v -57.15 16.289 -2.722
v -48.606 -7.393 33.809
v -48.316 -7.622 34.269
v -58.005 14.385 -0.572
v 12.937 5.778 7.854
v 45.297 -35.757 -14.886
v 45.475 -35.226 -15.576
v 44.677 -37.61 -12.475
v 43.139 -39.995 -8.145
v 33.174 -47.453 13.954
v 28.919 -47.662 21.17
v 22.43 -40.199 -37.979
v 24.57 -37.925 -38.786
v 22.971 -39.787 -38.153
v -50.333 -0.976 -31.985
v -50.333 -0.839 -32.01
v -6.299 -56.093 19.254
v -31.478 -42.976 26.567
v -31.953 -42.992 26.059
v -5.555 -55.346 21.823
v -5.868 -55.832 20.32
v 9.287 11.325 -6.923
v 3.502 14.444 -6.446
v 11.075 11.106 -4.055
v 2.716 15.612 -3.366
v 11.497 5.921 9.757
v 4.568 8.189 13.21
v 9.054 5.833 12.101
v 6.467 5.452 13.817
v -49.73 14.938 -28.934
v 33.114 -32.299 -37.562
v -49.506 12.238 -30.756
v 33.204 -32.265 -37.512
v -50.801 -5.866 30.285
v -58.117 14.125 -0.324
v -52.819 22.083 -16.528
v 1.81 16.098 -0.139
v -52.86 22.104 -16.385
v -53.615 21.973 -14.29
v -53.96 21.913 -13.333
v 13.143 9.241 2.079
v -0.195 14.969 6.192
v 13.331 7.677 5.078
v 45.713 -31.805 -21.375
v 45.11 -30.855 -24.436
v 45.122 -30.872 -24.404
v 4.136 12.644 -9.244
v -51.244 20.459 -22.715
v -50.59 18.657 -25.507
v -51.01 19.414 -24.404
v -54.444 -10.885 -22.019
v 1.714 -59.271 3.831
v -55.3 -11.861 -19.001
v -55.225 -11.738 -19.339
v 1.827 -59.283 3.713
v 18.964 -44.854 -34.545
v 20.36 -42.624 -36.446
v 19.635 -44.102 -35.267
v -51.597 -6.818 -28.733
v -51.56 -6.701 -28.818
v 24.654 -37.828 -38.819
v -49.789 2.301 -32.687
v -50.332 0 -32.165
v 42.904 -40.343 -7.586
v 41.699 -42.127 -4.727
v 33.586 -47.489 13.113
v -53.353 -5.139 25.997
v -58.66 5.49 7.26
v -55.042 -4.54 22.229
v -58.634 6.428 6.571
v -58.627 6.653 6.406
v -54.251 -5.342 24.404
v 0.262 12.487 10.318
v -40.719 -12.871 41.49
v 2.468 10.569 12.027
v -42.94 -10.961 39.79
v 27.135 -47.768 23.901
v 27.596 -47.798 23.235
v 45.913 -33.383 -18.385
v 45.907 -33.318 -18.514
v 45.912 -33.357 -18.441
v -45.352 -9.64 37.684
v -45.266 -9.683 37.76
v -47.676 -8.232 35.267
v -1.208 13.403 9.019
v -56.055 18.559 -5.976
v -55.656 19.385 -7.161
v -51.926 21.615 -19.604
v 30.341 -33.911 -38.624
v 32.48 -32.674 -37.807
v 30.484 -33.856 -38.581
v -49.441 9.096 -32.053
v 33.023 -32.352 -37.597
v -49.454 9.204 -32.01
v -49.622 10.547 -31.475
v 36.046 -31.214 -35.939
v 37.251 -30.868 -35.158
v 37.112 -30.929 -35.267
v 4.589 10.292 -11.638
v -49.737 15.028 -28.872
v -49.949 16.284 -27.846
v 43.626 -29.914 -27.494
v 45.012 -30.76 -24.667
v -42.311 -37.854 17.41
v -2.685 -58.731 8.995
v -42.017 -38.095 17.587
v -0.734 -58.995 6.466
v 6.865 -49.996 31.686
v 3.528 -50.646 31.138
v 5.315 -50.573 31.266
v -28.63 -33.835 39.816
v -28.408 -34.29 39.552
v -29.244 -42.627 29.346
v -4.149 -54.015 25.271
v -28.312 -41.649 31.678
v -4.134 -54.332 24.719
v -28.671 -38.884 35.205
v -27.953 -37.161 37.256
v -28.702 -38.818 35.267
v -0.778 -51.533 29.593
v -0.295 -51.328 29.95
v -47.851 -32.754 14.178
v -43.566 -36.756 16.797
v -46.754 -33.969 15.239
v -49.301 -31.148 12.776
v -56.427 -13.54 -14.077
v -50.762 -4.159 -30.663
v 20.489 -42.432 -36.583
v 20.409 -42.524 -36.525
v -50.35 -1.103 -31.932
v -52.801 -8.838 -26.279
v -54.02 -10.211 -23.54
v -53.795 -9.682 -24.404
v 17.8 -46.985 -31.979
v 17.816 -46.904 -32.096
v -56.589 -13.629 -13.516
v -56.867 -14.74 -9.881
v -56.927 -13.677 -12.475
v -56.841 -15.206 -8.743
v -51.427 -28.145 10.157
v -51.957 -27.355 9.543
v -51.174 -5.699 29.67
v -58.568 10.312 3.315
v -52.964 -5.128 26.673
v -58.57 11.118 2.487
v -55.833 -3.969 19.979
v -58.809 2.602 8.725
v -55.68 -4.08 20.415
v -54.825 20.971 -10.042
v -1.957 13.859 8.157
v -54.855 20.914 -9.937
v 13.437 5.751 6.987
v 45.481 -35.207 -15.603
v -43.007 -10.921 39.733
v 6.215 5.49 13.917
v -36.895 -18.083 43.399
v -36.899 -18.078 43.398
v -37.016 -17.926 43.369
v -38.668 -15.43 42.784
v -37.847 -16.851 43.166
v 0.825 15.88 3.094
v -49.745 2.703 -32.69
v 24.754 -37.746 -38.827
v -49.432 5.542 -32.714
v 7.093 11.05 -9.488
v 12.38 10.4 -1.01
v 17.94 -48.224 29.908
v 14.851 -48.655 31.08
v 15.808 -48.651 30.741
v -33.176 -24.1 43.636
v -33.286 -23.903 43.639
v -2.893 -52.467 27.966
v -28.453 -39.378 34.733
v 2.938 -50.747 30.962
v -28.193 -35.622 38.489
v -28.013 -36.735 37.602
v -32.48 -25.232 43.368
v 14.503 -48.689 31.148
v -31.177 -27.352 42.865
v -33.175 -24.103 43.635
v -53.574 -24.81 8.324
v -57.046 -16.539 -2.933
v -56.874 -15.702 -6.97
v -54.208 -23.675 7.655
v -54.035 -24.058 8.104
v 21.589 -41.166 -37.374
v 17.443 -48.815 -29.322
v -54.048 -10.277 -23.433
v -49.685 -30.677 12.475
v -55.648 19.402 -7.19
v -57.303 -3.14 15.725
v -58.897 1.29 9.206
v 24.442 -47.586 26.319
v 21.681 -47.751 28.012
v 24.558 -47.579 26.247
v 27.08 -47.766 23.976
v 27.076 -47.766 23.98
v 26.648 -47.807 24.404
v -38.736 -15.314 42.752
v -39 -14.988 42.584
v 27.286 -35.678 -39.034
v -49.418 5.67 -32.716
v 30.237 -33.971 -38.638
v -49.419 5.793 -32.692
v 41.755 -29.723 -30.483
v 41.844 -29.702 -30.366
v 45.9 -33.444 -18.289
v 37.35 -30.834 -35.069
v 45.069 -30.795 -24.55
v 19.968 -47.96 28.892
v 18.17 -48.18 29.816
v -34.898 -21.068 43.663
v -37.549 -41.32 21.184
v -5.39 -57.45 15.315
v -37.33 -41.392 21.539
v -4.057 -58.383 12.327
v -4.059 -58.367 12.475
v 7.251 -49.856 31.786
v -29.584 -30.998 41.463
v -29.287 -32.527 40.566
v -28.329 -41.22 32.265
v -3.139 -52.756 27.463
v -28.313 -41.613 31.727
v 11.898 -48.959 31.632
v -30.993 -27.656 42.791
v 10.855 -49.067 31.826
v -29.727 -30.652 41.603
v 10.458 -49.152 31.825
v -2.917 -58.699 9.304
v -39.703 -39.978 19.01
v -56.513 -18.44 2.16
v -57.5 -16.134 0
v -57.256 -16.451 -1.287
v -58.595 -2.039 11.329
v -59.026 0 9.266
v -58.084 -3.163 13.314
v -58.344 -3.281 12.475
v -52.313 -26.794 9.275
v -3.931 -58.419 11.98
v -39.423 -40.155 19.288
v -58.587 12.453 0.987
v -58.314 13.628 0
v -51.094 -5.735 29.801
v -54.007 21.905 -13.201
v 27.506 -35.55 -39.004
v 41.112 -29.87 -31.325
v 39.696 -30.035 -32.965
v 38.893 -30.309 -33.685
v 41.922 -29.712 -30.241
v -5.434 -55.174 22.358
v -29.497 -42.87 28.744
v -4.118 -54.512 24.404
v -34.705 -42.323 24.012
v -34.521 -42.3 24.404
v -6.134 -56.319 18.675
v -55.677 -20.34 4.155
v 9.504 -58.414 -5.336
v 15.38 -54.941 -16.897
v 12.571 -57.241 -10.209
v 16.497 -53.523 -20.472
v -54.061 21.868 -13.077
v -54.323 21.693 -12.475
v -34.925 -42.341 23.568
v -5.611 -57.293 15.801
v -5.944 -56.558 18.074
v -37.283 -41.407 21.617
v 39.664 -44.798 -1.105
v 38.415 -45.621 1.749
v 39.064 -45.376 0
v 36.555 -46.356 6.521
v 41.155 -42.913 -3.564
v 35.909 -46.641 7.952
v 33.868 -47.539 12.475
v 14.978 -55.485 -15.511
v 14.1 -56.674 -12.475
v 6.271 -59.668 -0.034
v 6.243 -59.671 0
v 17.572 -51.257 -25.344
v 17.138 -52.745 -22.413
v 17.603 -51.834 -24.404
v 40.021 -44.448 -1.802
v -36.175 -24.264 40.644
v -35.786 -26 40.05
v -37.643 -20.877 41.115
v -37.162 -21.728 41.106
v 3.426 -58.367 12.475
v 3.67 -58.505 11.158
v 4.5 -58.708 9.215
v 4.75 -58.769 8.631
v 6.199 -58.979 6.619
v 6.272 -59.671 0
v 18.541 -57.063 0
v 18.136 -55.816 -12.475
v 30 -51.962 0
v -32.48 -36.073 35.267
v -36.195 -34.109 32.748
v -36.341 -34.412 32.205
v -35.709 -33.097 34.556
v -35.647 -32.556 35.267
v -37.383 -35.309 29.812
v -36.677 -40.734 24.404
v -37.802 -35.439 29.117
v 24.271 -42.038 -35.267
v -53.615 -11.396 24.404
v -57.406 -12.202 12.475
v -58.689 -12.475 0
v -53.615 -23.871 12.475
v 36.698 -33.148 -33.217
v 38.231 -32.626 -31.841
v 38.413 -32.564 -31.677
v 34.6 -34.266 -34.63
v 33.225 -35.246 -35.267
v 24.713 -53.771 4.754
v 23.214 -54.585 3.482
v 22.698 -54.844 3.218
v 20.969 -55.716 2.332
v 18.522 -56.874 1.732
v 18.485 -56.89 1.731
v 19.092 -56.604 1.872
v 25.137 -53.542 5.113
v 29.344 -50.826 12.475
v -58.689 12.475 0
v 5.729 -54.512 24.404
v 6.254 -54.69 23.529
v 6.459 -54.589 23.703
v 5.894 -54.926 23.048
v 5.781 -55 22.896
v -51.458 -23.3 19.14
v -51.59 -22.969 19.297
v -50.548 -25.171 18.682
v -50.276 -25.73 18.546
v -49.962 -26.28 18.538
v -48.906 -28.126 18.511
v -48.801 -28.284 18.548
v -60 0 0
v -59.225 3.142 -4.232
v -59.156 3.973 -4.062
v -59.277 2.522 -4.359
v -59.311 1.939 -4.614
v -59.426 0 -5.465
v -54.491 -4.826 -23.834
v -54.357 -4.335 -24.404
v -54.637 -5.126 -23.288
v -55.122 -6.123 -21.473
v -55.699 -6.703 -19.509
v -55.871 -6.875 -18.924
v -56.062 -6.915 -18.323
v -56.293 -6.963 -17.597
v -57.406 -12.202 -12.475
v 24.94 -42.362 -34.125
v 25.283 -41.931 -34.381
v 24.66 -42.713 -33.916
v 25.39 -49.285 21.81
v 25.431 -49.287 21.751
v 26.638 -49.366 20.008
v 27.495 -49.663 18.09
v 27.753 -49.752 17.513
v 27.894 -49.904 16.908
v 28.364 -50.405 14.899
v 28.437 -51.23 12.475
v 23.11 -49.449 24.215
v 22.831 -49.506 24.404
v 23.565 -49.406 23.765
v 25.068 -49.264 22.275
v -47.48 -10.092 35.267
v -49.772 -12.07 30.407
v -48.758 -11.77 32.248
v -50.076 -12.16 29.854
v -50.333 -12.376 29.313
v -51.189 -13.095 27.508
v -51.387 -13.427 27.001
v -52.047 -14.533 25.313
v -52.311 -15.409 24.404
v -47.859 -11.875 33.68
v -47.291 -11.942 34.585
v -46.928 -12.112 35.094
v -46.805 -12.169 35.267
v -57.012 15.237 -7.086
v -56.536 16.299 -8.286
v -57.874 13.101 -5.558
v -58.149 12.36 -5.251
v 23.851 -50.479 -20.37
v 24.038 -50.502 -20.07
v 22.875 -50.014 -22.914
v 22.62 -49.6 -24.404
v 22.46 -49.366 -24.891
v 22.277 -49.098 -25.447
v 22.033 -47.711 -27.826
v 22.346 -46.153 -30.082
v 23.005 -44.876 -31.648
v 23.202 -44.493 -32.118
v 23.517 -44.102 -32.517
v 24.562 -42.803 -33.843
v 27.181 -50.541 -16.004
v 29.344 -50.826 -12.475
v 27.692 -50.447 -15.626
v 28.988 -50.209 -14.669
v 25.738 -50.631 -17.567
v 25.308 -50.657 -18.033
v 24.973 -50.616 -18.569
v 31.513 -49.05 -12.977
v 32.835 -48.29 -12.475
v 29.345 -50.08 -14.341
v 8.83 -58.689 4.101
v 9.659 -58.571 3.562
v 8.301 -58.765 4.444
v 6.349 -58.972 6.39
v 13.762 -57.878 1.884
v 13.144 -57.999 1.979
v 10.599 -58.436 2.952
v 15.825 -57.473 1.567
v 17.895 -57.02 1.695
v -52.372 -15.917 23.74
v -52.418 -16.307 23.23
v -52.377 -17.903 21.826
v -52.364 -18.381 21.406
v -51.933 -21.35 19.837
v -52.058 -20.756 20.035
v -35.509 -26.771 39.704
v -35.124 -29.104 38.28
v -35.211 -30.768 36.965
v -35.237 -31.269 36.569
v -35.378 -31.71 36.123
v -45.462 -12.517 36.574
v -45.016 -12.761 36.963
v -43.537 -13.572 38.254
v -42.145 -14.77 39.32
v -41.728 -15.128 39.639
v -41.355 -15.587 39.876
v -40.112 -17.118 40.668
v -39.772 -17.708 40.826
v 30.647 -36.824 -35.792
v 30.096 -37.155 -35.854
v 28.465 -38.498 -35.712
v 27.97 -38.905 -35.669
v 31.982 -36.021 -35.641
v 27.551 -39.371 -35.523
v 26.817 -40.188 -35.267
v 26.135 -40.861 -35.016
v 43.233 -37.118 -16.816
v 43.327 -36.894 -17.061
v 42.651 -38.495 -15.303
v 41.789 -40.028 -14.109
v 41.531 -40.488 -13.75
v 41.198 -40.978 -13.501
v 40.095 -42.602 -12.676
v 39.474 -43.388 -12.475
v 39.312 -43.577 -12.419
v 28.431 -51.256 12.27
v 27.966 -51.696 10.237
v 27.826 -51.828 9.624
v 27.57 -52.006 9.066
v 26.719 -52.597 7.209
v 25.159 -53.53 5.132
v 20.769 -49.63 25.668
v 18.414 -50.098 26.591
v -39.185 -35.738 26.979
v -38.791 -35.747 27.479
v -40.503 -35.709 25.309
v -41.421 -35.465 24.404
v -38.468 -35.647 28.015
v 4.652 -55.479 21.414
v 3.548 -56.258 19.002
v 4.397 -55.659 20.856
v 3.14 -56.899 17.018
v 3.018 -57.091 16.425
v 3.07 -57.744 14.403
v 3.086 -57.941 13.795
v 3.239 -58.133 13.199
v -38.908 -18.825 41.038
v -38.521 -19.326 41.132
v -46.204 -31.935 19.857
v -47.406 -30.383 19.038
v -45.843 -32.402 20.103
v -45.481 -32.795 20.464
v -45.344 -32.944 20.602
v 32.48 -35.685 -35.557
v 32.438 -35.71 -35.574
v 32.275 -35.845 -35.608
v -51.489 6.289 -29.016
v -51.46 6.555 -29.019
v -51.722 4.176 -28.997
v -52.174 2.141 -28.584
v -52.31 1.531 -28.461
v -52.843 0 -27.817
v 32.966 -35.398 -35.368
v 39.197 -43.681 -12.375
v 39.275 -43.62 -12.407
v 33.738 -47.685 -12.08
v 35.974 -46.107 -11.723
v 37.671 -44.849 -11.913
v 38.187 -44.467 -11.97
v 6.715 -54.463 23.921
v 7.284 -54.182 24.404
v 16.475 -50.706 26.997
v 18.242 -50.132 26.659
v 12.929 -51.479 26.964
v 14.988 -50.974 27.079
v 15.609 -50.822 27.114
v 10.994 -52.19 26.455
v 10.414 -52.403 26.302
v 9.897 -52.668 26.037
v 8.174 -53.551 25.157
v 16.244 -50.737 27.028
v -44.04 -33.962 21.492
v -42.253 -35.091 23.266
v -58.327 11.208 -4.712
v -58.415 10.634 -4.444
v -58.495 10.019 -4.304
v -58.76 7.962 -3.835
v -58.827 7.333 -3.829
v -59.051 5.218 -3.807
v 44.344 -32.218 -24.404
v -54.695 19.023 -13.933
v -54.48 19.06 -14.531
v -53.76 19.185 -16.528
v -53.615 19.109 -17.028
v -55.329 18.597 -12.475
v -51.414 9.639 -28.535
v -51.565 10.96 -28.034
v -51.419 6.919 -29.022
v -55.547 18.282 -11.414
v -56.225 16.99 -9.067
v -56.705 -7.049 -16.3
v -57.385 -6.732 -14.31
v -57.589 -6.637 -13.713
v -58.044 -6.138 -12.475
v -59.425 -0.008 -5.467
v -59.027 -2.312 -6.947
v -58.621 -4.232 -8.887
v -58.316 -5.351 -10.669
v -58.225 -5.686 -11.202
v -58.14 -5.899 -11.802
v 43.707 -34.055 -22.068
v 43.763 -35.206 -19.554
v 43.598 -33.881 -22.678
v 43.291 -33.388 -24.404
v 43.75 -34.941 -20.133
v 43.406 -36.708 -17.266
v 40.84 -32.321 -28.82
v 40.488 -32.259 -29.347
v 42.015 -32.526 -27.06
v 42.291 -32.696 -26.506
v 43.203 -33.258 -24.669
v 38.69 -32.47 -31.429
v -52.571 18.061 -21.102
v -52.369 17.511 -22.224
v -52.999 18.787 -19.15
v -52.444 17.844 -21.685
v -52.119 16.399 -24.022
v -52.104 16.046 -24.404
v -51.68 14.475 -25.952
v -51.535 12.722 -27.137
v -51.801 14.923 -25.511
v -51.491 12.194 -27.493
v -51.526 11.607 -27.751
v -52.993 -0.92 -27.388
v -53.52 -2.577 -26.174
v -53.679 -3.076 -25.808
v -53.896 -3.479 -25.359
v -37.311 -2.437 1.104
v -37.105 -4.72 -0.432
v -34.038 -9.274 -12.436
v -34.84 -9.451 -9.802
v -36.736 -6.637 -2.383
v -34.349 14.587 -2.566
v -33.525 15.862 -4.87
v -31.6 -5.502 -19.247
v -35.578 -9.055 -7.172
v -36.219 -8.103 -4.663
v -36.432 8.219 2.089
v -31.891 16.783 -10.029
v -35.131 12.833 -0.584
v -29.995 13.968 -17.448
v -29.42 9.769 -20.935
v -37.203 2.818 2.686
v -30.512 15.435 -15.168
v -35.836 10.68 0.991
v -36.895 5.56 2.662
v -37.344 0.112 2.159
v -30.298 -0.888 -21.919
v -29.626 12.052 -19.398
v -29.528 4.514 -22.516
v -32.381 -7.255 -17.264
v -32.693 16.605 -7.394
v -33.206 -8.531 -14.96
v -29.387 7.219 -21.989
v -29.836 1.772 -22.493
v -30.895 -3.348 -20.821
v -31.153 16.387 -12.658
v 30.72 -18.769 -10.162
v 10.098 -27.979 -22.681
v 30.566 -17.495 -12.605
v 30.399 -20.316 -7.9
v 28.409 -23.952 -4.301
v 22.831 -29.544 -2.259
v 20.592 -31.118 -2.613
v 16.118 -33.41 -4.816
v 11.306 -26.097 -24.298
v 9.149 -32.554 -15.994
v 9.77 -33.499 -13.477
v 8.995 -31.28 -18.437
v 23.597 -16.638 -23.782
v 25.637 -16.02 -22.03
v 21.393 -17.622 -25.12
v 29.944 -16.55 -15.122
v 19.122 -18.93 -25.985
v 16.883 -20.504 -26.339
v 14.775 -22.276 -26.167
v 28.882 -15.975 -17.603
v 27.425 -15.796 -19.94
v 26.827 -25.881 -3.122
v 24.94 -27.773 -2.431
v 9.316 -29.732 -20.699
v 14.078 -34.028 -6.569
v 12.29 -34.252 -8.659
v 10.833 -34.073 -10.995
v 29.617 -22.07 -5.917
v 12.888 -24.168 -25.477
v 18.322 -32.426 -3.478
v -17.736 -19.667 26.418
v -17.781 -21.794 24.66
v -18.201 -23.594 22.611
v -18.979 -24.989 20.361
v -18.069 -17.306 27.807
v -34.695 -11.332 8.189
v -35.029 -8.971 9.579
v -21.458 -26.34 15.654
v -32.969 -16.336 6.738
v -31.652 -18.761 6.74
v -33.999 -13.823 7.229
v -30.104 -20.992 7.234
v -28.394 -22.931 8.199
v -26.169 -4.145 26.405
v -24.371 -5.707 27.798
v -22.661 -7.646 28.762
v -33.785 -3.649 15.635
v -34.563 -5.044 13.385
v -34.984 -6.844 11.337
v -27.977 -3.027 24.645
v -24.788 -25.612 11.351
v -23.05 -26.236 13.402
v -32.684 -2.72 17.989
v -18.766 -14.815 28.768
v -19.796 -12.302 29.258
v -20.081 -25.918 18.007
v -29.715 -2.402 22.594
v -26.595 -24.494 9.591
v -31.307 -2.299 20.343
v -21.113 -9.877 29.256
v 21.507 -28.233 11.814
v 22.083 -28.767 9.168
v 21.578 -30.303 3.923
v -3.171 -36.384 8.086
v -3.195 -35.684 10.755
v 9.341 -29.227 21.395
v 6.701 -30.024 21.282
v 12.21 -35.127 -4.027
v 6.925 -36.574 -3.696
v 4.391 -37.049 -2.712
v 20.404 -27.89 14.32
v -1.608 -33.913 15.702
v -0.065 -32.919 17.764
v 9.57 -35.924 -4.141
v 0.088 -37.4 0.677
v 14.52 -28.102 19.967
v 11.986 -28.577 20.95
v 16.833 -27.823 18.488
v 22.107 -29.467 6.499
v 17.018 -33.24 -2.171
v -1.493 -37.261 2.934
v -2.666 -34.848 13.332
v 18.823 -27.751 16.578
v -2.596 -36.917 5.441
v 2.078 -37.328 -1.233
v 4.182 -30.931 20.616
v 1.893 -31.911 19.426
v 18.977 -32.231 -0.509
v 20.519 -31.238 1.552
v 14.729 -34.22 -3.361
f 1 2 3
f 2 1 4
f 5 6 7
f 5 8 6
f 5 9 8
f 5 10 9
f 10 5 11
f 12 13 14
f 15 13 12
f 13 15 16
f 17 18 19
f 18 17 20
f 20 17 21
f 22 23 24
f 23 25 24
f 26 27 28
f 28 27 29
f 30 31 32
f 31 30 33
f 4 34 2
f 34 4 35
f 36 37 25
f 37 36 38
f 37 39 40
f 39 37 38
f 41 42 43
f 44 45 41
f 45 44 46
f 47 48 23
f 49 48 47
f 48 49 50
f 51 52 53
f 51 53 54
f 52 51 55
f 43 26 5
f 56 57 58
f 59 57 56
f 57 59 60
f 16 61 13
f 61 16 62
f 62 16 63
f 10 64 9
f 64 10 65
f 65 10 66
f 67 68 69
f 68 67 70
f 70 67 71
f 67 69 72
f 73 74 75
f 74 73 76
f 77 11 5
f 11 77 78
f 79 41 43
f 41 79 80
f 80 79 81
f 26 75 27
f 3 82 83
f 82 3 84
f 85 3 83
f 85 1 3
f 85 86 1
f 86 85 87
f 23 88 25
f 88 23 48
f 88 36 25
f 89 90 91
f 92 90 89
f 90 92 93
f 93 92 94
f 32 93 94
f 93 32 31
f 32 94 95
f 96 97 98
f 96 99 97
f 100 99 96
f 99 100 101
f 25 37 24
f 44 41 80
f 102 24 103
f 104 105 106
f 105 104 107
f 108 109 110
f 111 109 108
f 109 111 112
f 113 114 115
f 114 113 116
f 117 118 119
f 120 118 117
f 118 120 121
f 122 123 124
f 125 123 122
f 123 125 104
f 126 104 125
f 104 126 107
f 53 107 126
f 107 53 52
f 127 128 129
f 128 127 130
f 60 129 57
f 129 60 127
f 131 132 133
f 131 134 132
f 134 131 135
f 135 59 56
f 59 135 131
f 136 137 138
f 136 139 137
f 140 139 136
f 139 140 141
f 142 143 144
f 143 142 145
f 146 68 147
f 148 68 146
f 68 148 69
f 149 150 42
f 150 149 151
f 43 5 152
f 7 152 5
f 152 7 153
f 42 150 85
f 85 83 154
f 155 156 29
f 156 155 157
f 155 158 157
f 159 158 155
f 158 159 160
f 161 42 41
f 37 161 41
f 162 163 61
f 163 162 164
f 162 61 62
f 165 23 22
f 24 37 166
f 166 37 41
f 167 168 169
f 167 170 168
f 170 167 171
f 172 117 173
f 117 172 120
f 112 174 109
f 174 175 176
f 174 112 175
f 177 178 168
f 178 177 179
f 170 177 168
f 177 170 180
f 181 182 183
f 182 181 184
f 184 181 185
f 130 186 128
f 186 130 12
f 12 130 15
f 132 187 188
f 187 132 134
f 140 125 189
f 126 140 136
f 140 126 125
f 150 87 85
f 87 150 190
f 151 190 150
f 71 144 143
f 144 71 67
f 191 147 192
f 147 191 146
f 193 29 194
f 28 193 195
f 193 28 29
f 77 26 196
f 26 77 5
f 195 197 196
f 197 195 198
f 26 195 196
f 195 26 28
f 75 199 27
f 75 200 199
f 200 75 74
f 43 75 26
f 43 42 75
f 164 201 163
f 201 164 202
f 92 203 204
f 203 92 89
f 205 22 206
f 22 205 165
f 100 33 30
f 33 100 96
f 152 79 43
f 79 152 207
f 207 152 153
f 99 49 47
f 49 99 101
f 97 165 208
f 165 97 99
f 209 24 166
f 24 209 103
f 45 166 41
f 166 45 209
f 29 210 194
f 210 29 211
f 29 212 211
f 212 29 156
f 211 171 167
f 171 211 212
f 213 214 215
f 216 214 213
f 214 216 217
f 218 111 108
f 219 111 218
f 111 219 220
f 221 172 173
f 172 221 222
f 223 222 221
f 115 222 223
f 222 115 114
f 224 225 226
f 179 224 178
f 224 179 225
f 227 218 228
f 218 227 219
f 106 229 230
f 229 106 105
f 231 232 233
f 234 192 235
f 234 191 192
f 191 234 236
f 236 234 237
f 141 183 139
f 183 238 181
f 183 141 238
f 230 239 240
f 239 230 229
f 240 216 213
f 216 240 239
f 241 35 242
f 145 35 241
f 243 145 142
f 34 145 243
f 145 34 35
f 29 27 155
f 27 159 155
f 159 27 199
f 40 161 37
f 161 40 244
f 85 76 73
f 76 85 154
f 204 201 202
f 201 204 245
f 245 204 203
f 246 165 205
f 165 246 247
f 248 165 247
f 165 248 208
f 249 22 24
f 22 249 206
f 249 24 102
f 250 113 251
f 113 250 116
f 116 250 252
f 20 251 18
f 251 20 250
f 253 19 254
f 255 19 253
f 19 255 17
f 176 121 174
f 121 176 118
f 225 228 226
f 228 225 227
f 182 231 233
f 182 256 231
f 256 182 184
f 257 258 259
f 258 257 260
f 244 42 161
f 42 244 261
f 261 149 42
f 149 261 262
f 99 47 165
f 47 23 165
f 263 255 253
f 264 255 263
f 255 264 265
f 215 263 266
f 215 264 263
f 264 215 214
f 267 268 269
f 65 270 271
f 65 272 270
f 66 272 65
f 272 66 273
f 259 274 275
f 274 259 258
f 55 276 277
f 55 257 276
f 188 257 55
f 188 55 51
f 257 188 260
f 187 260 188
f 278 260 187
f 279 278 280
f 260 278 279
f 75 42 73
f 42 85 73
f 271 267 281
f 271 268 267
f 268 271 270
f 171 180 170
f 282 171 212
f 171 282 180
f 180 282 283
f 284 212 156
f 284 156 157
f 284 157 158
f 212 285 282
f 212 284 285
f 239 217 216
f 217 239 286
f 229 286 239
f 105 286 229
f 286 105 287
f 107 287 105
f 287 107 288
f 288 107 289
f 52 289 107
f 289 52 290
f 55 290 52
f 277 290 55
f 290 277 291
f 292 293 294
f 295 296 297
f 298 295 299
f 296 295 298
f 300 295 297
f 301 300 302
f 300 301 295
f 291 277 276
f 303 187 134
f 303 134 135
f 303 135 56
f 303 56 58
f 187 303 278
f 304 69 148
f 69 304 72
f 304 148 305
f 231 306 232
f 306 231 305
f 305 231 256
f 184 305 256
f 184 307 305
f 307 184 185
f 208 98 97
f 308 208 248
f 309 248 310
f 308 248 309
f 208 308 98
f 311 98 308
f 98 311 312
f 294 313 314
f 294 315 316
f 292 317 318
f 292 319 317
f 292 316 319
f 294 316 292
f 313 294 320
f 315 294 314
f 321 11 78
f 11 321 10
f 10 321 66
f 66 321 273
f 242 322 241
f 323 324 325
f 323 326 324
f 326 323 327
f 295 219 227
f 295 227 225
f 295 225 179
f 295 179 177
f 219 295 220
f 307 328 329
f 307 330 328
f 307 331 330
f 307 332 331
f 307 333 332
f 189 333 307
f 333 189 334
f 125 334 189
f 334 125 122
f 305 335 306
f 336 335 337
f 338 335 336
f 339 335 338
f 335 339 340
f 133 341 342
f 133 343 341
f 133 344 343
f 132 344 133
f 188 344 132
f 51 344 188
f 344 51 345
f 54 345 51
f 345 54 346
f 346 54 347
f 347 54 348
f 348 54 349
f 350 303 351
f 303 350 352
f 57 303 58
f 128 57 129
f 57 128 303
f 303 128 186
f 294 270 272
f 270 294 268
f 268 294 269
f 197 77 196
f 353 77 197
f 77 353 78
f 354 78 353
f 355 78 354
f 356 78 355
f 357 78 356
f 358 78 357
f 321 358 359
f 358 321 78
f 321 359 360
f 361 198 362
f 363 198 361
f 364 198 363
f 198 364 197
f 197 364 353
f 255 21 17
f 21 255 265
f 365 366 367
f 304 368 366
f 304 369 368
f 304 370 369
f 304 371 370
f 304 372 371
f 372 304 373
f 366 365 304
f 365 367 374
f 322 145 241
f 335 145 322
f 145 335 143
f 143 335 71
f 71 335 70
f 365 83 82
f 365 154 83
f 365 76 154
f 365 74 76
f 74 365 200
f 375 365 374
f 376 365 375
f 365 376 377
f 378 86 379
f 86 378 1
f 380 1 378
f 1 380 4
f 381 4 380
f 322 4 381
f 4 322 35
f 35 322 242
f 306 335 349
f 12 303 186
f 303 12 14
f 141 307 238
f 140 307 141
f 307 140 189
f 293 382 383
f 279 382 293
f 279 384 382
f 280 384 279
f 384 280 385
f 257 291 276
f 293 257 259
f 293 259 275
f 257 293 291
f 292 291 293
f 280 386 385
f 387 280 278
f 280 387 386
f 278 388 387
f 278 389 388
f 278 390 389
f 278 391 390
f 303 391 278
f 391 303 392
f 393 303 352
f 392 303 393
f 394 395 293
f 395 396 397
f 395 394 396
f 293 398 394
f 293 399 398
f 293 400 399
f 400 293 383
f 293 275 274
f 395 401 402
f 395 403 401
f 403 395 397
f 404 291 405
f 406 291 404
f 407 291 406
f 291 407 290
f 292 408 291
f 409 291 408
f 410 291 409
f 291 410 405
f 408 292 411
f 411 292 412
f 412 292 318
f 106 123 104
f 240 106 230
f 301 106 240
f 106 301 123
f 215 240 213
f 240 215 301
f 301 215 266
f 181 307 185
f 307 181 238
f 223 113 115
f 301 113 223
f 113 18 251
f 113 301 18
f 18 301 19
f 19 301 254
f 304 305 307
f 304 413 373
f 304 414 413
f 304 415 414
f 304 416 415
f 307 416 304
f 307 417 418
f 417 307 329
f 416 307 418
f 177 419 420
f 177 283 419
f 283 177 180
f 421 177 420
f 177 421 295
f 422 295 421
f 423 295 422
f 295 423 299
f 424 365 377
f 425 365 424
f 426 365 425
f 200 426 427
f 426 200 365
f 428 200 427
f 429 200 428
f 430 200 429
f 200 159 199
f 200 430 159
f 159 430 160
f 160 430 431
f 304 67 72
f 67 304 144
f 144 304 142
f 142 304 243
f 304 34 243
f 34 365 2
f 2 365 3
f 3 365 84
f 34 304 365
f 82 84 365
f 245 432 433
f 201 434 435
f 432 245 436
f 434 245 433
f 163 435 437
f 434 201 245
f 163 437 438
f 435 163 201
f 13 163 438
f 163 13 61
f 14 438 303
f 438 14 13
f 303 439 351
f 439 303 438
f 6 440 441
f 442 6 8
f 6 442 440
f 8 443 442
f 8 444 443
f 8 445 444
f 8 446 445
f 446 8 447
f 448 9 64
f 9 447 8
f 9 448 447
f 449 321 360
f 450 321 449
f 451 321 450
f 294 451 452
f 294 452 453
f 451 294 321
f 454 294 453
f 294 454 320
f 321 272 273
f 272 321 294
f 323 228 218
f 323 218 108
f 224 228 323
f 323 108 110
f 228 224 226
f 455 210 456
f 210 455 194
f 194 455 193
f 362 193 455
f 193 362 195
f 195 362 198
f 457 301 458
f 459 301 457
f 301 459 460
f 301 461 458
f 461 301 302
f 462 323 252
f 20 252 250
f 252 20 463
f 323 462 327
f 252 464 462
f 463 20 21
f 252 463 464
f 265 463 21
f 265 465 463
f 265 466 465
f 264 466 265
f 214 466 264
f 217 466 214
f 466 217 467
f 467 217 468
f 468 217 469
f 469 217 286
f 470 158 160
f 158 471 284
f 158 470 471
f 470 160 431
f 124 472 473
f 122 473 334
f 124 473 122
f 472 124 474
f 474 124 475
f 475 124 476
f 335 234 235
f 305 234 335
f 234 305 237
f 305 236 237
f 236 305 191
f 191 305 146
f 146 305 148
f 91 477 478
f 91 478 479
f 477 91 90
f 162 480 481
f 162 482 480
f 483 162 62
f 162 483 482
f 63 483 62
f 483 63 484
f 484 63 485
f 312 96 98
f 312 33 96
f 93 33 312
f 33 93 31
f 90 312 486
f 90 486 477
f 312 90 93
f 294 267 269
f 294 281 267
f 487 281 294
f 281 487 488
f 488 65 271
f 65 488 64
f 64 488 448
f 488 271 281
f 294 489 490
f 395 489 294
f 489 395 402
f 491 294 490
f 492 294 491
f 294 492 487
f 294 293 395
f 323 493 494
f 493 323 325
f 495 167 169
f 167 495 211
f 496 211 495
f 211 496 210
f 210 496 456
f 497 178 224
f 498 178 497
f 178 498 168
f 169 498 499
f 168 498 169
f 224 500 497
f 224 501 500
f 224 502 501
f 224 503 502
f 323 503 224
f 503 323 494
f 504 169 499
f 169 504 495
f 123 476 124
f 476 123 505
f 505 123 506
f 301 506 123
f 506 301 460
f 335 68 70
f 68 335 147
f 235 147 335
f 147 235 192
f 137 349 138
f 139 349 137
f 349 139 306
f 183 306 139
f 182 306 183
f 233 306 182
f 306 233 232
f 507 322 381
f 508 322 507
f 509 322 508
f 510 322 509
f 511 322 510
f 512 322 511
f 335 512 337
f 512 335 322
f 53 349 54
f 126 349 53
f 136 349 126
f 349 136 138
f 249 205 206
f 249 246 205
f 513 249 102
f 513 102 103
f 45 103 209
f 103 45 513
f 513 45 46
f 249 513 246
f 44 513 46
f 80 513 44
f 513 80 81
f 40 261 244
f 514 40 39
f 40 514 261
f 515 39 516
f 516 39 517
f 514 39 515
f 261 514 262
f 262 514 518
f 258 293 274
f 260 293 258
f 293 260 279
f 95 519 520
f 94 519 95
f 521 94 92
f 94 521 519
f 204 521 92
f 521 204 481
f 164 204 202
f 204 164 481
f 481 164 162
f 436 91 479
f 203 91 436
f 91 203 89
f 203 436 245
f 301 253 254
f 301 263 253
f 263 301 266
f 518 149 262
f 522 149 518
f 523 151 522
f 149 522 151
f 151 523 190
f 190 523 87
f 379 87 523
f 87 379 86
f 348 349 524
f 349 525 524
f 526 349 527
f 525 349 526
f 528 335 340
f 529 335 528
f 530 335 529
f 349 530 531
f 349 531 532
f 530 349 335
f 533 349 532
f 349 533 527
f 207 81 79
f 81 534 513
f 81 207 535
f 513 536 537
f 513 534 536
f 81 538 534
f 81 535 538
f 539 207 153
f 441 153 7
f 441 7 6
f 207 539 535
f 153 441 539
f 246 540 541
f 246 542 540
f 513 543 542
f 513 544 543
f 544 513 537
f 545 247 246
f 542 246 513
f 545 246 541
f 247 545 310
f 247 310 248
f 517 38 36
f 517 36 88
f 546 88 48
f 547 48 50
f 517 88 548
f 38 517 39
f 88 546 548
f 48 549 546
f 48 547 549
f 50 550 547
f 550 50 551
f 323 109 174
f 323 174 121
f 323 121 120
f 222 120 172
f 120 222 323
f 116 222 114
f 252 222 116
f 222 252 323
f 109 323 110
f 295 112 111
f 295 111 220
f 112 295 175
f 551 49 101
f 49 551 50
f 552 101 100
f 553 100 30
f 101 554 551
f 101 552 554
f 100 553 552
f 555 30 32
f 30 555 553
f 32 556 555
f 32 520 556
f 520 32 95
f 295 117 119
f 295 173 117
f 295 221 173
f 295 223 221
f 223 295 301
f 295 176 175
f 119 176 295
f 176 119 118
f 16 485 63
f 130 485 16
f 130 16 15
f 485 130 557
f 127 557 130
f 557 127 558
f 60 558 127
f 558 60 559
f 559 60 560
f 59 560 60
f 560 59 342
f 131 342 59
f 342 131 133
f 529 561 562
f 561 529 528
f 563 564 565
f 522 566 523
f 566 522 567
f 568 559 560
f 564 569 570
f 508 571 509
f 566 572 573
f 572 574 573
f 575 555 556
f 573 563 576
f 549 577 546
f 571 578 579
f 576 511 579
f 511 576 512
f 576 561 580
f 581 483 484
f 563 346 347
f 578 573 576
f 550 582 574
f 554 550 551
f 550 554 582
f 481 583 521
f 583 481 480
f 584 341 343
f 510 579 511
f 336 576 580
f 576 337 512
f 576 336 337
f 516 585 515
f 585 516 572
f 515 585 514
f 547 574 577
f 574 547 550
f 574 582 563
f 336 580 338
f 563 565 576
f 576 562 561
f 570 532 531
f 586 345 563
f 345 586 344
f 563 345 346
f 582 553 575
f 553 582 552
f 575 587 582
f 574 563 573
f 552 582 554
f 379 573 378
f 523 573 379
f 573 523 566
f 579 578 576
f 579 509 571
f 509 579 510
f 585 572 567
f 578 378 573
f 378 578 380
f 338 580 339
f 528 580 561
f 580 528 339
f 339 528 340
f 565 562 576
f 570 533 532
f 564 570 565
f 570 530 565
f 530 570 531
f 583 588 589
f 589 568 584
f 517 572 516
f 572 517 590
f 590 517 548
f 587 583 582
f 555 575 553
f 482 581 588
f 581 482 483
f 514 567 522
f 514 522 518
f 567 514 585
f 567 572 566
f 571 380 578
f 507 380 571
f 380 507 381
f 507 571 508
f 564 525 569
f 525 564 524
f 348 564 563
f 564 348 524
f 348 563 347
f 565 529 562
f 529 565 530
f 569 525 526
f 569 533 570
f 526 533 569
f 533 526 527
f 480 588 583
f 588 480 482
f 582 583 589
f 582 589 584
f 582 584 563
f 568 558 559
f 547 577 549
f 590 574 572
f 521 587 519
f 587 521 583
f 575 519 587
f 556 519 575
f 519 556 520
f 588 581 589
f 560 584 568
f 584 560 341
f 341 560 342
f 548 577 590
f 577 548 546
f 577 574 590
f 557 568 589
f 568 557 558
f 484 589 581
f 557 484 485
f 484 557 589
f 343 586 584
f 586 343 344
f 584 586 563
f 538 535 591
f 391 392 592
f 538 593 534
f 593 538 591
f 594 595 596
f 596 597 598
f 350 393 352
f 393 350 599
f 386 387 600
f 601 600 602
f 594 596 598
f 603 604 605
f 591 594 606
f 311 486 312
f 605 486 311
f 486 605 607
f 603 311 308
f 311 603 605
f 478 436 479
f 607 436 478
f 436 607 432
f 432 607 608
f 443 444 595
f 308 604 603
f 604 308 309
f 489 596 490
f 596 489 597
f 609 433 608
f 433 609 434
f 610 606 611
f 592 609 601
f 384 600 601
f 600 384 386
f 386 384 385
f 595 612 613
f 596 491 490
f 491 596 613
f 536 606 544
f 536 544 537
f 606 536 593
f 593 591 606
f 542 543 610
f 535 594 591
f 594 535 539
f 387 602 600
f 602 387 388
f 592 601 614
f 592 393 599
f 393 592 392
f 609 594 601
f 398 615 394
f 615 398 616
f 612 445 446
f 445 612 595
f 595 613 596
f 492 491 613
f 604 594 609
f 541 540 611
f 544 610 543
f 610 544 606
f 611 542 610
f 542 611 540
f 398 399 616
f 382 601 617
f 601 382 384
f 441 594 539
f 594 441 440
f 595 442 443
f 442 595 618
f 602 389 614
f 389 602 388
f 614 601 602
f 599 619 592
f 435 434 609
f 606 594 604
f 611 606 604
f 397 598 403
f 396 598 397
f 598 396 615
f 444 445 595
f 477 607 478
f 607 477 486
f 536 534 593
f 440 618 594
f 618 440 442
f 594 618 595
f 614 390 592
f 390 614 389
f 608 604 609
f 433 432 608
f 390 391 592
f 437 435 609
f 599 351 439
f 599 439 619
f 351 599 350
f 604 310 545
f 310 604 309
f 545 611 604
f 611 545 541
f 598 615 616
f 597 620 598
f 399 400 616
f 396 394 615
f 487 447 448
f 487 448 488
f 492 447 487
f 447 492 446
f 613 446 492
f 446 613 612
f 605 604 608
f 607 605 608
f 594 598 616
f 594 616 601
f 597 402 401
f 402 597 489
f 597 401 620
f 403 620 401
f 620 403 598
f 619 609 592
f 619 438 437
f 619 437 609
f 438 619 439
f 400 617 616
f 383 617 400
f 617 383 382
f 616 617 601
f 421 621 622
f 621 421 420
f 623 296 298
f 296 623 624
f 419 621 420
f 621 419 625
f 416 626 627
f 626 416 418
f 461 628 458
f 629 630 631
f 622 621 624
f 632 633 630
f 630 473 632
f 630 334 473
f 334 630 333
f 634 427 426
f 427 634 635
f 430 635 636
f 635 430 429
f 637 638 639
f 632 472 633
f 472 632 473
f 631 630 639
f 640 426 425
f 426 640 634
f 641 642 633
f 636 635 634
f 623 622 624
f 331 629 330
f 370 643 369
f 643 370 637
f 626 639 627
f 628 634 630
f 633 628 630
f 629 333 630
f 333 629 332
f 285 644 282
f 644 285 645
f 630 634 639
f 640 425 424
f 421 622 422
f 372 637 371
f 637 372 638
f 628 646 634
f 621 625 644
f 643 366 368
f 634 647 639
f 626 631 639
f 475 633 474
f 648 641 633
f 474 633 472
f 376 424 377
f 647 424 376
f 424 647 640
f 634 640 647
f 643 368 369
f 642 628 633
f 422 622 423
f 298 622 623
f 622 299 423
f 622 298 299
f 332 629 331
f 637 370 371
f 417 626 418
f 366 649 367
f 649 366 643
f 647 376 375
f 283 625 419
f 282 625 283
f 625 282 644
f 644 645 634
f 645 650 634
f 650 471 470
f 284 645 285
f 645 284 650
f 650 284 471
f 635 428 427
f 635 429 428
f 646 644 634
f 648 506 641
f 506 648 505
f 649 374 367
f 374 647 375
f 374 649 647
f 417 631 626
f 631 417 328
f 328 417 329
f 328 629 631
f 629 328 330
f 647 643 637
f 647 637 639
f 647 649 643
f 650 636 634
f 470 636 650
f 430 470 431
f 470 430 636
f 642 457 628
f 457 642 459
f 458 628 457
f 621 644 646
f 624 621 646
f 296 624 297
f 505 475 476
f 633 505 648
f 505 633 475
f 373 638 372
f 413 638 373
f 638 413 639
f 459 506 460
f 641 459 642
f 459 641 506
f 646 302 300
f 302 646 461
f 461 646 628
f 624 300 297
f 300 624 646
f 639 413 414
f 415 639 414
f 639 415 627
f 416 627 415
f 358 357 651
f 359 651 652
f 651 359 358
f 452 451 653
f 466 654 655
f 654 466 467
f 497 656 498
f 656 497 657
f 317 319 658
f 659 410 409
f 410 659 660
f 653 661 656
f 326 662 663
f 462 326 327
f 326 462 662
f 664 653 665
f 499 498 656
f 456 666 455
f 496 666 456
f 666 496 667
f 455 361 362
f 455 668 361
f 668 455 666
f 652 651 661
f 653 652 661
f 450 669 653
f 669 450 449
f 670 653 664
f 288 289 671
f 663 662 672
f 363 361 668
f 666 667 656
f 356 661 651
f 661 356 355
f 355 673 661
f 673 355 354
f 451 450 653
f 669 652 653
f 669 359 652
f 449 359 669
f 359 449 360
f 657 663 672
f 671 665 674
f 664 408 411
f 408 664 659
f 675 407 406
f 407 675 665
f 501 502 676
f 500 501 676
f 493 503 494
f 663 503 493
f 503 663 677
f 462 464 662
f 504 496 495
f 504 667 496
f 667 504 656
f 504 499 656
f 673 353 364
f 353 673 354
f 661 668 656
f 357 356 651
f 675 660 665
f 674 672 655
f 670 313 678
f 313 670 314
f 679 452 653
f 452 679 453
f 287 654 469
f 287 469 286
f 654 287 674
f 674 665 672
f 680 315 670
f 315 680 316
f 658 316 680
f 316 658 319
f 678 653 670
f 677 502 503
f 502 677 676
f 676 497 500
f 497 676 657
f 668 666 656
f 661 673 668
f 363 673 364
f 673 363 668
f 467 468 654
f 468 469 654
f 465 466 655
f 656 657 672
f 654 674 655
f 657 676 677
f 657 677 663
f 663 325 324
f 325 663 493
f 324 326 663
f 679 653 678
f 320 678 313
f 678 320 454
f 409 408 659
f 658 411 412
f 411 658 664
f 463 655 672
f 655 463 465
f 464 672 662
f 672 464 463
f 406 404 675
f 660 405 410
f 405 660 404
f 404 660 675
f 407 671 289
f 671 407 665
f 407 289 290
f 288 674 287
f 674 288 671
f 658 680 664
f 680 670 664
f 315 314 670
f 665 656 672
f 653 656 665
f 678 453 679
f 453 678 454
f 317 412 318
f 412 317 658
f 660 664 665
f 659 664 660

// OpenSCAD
difference() {
	intersection() {
		hull() {
			rotate(a = -44.0760747966, v = [-0.6353131492, 0.2832921829, 0.0000000000]) {
				rotate(a = -90.0000000000, v = [0.0000000000, 1.0000000000, -0.0000000000]) {
					cylinder(h = 60, r = 16.2000000000);
				}
			}
			rotate(a = -44.0760747966, v = [-0.6353131492, 0.2832921829, 0.0000000000]) {
				rotate(a = -90.0000000000, v = [-0.8660254038, -0.5000000000, 0.0000000000]) {
					cylinder(h = 60, r = 16.2000000000);
				}
			}
			rotate(a = -44.0760747966, v = [-0.6353131492, 0.2832921829, 0.0000000000]) {
				rotate(a = -32.5529951665, v = [0.0926239006, 0.5300474731, -0.0000000000]) {
					cylinder(h = 60, r = 16.2000000000);
				}
			}
			rotate(a = -44.0760747966, v = [-0.6353131492, 0.2832921829, 0.0000000000]) {
				rotate(a = -46.2229214243, v = [-0.5838132168, -0.4248525055, 0.0000000000]) {
					cylinder(h = 60, r = 16.2000000000);
				}
			}
		}
		sphere(r = 60);
	}
	union() {
		rotate(a = -44.0760747966, v = [-0.6353131492, 0.2832921829, 0.0000000000]) {
			rotate(a = -90.0000000000, v = [0.0000000000, 1.0000000000, -0.0000000000]) {
				translate(v = [0, 0, 35]) {
					cylinder(h = 100, r = 13.2000000000);
				}
			}
		}
		rotate(a = -44.0760747966, v = [-0.6353131492, 0.2832921829, 0.0000000000]) {
			rotate(a = -90.0000000000, v = [-0.8660254038, -0.5000000000, 0.0000000000]) {
				translate(v = [0, 0, 35]) {
					cylinder(h = 100, r = 13.2000000000);
				}
			}
		}
		rotate(a = -44.0760747966, v = [-0.6353131492, 0.2832921829, 0.0000000000]) {
			rotate(a = -32.5529951665, v = [0.0926239006, 0.5300474731, -0.0000000000]) {
				translate(v = [0, 0, 35]) {
					cylinder(h = 100, r = 13.2000000000);
				}
			}
		}
		rotate(a = -44.0760747966, v = [-0.6353131492, 0.2832921829, 0.0000000000]) {
			rotate(a = -46.2229214243, v = [-0.5838132168, -0.4248525055, 0.0000000000]) {
				translate(v = [0, 0, 35]) {
					cylinder(h = 100, r = 13.2000000000);
				}
			}
		}
	}
}
